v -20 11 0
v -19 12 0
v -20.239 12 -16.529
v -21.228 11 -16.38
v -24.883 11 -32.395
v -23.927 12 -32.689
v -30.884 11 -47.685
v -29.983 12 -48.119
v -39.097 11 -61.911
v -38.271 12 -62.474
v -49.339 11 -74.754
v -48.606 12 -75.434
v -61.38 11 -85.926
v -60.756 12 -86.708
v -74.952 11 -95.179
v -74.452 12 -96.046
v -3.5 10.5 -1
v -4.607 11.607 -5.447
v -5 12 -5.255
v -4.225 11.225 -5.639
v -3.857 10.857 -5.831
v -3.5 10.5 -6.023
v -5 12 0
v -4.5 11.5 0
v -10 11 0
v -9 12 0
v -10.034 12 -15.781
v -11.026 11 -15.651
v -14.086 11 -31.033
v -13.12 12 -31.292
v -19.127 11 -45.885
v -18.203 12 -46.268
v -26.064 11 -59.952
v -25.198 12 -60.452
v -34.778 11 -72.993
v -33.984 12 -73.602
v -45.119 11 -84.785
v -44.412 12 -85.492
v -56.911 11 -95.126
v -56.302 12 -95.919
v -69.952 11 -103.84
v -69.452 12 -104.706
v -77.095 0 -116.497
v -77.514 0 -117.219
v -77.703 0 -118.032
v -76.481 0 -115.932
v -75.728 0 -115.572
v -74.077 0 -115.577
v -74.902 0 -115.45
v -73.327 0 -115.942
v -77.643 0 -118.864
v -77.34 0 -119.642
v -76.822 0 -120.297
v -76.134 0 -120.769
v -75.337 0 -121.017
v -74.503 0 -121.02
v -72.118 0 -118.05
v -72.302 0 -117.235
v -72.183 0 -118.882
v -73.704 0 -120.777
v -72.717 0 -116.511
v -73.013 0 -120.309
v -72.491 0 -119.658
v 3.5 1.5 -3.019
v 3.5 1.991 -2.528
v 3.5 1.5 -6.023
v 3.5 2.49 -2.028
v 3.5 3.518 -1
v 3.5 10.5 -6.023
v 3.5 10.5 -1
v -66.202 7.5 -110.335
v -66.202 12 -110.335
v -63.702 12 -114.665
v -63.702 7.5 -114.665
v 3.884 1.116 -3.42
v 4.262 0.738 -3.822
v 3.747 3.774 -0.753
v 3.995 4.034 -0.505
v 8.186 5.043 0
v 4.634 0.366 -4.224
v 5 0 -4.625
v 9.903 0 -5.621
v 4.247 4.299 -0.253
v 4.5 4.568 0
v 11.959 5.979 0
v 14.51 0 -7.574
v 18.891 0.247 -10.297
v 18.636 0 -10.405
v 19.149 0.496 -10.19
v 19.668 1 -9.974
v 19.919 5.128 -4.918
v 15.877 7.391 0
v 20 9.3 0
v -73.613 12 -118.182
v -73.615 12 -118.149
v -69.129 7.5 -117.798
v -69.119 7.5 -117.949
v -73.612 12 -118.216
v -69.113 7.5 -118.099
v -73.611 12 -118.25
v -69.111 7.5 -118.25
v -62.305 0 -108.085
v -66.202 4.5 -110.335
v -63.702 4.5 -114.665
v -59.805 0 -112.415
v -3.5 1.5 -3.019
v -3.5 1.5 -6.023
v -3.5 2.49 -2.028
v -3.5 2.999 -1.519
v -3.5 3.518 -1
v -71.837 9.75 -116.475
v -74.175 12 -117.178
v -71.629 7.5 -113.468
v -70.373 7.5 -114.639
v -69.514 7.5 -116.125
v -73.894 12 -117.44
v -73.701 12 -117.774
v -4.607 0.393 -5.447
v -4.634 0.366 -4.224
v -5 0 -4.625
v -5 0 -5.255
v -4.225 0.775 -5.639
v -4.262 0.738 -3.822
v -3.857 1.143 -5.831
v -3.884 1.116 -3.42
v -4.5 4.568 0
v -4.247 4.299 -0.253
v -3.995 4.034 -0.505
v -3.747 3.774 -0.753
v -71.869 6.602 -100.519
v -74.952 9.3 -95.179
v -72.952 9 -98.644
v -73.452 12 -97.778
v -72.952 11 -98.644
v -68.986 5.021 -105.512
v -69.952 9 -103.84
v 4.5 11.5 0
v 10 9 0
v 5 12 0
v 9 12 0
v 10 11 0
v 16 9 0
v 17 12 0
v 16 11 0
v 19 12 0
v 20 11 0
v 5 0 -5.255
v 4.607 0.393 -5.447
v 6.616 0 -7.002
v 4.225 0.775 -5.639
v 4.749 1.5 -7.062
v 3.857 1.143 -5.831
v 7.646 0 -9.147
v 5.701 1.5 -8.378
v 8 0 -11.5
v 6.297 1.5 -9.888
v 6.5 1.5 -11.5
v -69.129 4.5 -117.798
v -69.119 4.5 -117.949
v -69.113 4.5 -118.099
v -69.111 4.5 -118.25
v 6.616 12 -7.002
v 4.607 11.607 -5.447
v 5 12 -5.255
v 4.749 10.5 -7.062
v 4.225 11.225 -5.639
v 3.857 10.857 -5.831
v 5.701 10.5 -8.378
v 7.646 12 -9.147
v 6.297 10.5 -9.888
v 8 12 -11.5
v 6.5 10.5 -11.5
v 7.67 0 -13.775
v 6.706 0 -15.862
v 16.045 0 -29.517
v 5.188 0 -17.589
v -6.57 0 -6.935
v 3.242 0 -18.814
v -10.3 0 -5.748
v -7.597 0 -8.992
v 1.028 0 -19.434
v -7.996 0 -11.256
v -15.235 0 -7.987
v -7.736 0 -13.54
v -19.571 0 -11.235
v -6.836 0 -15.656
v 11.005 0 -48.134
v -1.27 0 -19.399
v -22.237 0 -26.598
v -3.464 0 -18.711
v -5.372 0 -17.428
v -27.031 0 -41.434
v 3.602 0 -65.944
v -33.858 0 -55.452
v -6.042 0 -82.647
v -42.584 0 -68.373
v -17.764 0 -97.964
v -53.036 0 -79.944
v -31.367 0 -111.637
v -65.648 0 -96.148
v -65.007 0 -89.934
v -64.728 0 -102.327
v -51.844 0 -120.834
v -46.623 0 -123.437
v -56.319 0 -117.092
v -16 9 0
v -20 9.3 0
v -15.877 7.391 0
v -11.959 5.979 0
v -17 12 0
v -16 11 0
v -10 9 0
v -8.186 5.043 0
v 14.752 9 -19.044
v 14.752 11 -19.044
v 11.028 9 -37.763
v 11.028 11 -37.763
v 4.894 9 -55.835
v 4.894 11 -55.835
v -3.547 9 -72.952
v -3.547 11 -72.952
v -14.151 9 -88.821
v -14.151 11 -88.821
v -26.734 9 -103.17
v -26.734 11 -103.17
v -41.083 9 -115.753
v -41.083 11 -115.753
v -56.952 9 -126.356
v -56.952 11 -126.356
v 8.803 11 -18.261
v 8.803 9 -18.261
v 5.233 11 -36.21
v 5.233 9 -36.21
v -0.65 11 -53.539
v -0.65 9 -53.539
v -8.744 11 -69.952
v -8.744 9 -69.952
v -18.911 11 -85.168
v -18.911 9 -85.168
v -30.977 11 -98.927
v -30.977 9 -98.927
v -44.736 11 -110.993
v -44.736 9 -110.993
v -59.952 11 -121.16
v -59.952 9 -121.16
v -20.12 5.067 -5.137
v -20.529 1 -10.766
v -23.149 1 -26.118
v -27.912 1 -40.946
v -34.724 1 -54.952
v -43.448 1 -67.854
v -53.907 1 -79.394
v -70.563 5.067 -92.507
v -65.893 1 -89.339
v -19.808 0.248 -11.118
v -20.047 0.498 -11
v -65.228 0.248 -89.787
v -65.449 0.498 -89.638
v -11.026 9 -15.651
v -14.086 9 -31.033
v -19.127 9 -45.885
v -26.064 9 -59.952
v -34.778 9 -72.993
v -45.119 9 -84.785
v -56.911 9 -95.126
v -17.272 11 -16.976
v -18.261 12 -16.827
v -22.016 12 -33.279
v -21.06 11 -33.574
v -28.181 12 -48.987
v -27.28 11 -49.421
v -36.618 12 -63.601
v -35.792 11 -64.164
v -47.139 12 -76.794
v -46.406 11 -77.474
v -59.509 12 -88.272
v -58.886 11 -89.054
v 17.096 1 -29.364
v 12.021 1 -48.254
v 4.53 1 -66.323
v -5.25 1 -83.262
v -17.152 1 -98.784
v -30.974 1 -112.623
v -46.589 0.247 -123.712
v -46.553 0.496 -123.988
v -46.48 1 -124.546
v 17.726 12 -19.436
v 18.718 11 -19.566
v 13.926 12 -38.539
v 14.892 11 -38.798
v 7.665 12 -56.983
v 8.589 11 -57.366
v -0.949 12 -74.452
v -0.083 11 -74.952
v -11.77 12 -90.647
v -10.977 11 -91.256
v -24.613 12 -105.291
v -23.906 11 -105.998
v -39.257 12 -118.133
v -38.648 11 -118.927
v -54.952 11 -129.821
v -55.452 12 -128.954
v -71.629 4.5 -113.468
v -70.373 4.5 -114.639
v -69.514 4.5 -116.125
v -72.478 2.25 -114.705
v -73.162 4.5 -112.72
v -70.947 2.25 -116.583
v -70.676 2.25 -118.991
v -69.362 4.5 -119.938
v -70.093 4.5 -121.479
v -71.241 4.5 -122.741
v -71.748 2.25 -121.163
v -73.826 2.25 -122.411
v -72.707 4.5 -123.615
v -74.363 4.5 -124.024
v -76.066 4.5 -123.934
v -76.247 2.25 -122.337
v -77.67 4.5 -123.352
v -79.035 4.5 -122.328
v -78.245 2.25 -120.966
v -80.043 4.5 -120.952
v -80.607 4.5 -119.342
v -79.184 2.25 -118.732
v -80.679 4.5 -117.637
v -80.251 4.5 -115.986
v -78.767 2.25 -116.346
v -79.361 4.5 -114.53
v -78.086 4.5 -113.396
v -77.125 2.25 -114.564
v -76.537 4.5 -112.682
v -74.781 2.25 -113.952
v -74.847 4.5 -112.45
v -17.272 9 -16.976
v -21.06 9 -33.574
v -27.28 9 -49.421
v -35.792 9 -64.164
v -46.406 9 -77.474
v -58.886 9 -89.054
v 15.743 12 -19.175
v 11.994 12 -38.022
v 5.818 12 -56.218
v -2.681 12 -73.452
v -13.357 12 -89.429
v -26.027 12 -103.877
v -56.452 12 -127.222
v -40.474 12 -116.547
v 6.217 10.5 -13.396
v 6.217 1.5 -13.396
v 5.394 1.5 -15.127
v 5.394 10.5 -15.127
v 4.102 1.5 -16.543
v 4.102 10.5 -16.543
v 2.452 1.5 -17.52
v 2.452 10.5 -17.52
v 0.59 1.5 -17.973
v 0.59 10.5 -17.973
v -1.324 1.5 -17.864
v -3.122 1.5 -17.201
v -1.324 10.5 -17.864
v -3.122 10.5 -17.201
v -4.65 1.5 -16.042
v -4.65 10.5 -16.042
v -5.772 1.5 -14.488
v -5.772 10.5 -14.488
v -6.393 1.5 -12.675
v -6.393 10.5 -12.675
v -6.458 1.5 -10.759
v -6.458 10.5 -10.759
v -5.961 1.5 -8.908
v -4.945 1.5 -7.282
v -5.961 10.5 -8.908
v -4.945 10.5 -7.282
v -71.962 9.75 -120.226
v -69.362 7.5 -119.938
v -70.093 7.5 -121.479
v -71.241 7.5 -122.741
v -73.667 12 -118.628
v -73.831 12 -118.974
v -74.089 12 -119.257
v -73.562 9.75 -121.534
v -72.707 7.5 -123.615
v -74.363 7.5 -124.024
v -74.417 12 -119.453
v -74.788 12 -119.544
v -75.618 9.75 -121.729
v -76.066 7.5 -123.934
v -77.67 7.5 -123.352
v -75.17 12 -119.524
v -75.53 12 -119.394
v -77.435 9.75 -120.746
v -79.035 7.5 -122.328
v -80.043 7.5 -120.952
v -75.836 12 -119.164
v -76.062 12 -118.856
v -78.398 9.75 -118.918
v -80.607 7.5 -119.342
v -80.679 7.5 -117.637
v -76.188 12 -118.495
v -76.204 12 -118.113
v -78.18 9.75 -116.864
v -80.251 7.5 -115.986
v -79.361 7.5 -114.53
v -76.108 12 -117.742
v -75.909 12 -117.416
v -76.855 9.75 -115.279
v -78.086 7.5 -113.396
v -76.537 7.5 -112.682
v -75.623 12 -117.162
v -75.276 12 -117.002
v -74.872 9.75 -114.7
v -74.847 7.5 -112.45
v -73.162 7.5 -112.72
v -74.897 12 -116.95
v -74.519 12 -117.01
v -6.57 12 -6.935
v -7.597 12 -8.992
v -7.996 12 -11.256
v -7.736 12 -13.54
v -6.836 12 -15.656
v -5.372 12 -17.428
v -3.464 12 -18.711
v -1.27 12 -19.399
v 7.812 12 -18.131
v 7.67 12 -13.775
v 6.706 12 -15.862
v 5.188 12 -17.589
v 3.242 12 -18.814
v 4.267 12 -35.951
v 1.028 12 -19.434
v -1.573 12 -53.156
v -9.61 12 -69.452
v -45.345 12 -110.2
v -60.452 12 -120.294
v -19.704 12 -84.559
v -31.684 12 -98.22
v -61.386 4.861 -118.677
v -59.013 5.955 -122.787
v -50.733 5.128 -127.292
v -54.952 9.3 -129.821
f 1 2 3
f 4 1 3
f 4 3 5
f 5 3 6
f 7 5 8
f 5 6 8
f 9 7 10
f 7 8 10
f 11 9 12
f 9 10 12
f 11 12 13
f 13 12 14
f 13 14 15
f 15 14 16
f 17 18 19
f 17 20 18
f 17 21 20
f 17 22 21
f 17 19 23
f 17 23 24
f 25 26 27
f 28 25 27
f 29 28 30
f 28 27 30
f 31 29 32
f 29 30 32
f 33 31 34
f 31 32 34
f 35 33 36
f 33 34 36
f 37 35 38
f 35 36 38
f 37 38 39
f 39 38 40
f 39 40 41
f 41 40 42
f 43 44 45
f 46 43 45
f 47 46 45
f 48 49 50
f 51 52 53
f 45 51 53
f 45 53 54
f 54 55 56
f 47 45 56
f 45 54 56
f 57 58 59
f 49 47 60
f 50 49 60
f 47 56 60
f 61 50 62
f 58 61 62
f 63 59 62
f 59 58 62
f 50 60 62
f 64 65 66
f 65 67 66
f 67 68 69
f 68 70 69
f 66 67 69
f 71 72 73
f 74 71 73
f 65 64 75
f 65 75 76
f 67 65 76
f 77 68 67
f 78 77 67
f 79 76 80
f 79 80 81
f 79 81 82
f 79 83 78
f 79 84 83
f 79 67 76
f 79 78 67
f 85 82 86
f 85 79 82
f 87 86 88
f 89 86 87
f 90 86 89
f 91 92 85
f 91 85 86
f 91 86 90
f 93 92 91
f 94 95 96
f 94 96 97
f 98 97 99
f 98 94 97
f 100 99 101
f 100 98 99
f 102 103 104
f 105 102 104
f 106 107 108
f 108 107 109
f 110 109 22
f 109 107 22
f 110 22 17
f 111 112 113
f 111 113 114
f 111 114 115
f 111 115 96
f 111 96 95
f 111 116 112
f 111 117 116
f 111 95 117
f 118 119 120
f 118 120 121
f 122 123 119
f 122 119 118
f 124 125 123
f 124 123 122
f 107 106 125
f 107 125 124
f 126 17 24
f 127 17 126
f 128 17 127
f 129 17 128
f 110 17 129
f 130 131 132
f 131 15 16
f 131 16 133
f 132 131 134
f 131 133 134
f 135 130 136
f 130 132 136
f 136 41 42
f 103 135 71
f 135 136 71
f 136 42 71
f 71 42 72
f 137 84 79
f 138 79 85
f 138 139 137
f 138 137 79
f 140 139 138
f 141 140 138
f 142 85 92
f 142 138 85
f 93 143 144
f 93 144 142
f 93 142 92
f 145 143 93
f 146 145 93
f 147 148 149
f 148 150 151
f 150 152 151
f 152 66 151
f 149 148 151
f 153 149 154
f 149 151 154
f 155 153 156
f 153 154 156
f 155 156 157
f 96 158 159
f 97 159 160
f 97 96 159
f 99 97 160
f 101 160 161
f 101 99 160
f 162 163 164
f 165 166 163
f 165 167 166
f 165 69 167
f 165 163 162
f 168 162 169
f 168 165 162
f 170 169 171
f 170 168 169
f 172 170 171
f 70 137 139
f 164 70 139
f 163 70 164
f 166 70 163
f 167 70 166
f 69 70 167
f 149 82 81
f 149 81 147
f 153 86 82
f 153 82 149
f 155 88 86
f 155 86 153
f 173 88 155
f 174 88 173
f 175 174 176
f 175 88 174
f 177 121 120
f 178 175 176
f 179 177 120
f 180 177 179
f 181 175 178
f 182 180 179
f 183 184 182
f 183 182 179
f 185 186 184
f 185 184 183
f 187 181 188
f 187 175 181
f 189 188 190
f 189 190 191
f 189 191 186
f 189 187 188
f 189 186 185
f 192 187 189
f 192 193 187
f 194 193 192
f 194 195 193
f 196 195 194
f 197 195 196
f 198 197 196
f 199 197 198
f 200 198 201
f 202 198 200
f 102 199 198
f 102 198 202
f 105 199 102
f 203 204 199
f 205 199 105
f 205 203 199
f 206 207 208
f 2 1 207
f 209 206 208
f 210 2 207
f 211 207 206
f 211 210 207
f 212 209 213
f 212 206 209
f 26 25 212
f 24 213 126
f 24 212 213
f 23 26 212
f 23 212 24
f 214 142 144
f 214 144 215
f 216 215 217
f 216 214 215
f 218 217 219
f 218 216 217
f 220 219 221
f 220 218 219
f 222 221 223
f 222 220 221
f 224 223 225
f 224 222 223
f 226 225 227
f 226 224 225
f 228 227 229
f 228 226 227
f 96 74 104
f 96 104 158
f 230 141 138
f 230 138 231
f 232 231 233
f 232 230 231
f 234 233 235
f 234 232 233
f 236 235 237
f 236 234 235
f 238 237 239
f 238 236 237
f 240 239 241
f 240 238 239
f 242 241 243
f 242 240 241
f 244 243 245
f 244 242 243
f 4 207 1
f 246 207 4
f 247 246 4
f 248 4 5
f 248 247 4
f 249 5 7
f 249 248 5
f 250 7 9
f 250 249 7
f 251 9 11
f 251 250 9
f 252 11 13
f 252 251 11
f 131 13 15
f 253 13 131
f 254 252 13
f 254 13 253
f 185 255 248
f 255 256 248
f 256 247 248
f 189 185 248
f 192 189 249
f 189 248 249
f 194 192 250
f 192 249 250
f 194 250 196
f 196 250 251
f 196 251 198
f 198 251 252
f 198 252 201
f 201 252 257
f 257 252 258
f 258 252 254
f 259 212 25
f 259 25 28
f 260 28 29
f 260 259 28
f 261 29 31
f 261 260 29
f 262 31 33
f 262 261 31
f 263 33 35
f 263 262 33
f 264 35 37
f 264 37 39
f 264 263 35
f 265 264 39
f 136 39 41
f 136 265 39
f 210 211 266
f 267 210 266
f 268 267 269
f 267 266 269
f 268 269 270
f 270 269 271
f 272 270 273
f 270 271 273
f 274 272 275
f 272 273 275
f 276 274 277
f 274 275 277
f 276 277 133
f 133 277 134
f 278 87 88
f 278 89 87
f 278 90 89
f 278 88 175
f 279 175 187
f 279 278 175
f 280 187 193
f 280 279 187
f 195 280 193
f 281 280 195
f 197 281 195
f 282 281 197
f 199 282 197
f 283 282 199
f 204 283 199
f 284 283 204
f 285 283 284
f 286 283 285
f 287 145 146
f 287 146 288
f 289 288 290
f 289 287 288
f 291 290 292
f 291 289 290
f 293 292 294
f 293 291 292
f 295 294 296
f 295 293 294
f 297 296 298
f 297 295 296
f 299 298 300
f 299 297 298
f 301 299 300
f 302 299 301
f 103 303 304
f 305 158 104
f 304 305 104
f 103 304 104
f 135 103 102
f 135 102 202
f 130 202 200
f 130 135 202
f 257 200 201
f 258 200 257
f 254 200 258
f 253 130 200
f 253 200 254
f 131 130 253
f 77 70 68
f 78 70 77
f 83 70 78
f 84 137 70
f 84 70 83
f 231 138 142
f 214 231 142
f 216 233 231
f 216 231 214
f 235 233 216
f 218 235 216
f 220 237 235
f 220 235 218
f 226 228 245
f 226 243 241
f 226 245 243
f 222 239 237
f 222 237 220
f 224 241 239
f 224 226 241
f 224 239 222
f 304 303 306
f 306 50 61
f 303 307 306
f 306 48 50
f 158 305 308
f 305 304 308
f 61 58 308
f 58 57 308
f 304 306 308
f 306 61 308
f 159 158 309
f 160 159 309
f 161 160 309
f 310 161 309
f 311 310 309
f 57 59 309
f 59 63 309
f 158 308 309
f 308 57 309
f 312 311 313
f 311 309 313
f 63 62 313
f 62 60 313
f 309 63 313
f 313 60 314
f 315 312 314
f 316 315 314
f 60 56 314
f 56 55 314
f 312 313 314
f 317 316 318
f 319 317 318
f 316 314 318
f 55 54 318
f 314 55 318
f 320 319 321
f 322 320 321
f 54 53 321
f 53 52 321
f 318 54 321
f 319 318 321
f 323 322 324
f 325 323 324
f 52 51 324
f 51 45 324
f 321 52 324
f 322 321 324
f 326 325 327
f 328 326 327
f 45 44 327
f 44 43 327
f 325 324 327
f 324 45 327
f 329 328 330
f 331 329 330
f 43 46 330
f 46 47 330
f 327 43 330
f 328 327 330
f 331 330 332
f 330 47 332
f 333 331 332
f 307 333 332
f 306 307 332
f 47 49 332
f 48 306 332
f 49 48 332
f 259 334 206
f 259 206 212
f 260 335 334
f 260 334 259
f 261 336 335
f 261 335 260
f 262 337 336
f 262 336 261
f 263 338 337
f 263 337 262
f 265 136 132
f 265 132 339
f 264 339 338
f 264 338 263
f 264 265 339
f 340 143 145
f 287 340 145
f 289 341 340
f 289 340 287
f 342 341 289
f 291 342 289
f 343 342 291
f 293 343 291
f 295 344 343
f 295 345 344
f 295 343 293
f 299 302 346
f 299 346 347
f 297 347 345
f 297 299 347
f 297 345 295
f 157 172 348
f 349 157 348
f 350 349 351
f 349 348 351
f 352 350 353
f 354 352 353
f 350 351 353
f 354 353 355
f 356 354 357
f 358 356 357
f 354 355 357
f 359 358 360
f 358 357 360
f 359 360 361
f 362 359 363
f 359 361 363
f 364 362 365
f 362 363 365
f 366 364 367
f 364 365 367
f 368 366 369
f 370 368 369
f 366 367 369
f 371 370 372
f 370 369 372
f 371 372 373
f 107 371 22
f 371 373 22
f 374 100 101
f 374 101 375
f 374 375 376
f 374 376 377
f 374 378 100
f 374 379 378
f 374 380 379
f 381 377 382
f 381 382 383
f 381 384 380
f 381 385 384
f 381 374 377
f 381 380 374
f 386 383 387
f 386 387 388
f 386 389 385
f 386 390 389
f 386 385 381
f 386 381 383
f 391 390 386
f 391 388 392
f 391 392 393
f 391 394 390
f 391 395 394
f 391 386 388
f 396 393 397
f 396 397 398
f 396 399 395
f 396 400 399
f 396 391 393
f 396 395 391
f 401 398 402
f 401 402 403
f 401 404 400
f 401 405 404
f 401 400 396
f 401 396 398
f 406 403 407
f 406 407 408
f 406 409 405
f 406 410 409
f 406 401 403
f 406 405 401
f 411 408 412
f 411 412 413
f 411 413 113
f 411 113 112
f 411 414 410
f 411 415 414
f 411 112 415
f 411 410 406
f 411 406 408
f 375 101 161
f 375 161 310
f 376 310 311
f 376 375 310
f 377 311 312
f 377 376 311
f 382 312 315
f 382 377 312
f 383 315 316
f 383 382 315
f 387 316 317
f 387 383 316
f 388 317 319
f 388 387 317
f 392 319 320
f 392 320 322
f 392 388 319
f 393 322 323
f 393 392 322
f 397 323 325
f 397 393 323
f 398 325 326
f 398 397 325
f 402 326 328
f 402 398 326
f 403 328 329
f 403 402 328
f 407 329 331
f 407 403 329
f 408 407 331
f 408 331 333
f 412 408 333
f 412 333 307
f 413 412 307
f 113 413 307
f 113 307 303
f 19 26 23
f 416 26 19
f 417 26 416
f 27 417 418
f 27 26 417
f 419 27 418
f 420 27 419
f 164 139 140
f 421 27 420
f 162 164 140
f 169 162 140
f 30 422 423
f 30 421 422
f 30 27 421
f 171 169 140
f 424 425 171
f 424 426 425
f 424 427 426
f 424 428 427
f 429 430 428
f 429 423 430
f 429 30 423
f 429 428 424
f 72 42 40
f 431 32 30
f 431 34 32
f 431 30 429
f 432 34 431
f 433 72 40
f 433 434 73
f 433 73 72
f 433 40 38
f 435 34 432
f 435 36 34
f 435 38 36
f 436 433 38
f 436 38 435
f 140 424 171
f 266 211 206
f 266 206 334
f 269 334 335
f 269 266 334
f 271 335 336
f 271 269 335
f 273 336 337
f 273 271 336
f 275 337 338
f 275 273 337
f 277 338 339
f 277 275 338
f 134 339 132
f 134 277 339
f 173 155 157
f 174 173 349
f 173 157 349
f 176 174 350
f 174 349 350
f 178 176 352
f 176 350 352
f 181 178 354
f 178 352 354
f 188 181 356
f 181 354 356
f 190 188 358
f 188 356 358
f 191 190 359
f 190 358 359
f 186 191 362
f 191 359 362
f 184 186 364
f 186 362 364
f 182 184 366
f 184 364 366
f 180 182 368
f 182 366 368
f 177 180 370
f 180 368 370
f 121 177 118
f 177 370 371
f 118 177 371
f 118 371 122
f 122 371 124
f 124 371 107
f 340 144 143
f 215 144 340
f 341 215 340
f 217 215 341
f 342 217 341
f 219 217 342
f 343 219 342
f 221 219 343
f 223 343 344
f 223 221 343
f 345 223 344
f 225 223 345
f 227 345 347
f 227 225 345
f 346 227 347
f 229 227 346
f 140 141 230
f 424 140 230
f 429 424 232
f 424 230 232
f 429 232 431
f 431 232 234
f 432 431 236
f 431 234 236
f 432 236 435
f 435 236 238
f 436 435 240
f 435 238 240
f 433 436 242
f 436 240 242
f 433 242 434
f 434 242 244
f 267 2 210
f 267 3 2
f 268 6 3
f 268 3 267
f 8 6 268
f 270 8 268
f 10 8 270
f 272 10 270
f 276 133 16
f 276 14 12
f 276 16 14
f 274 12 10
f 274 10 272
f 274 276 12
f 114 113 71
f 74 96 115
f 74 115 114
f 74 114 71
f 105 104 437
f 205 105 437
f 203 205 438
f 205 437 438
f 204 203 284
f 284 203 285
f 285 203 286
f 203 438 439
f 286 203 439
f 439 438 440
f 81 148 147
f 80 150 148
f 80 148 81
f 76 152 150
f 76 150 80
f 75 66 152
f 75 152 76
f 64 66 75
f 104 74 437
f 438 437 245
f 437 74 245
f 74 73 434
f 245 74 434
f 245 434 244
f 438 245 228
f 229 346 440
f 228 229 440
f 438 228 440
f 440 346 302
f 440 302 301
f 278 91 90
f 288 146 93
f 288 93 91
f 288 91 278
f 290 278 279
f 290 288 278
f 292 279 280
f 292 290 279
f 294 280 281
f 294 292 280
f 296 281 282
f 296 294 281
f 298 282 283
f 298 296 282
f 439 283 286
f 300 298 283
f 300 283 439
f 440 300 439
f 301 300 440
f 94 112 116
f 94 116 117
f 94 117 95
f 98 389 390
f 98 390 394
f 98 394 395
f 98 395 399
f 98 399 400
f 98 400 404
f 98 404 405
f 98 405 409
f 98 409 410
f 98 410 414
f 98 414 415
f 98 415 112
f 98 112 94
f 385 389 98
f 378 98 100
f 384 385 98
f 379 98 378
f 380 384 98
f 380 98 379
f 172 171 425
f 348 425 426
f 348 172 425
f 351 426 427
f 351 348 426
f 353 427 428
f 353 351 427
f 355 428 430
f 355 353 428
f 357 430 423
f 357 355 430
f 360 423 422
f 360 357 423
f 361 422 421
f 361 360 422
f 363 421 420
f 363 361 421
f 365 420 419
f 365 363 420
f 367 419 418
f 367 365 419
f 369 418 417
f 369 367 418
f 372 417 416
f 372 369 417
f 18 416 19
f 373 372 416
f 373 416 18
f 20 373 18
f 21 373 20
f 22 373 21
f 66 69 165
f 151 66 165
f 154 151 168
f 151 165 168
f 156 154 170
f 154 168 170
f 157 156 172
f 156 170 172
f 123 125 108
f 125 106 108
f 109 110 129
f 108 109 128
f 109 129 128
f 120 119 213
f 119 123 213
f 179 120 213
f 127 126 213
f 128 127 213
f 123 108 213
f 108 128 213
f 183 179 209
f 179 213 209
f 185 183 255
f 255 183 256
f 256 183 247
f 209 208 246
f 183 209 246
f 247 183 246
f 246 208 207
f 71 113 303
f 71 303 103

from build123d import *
from build123d.topology import SkipClean

# Parameters (mm, degrees)
REVOLVE1_ANGLE       = 60
CUT_EXTRUDE1_DEPTH   = 151.383351548
BOSS_EXTRUDE1_DEPTH  = 12
BOSS_EXTRUDE2_DEPTH  = 7.5
CUT_EXTRUDE2_DEPTH   = 4.5
CHAMFER2_SIZE        = 4.5
CHAMFER5_SIZE        = 4.5
CHAMFER5_SIZE_2      = 3
CHAMFER3_SIZE        = 1.5
CUT_REVOLVE1_ANGLE   = 90
CHAMFER4_SIZE        = 4.5
MIRROR4_COPY_1_ANGLE = 90
CHAMFER1_SIZE        = 1


# Some blends are built 0.0001 mm under size
with BuildPart() as part:
    # Sketch2 → Revolve1 (revolve)
    with BuildSketch(Plane.XY):
        Polygon((-16, 12), (-20, 12), (-20, 0), (20, 0), (20, 12), (16, 12), (16, 9), (10, 9), (10, 12), (-10, 12), (-10, 9), (-16, 9), align=None)
    revolve(axis=Axis((-129.903810568, 0, 0), (0, 1, 0)), revolution_arc=REVOLVE1_ANGLE)

    # Sketch3 → Cut-Extrude1 (cut, through all)
    with BuildSketch(Plane(origin=(0, 12, 0), x_dir=(1, 0, 0), z_dir=(0, 1, 0))):
        with BuildLine():
            ThreePointArc((6.5, 11.5), (-3.122498999, 17.200877125), (-3.5, 6.022774425))
            Line((-3.5, 6.022774425), (-3.5, 11.5))
            Line((-3.5, 11.5), (3.5, 11.5))
            Line((3.5, 11.5), (3.5, 6.022774425))
            ThreePointArc((3.5, 6.022774425), (5.700877125, 8.377501001), (6.5, 11.5))
        make_face()
        with BuildLine():
            Line((-3.5, 11.5), (-3.5, 6.022774425))
            ThreePointArc((-3.5, 6.022774425), (0, 5), (3.5, 6.022774425))
            Line((3.5, 6.022774425), (3.5, 11.5))
            Line((3.5, 11.5), (-3.5, 11.5))
        make_face()
        with BuildLine():
            Line((-3.5, 6.022774425), (-3.5, 0))
            Line((-3.5, 0), (3.5, 0))
            Line((3.5, 0), (3.5, 6.022774425))
            ThreePointArc((3.5, 6.022774425), (0, 5), (-3.5, 6.022774425))
        make_face()
    extrude(amount=-CUT_EXTRUDE1_DEPTH, mode=Mode.SUBTRACT)



with BuildPart() as body_2:
    # Sketch4 → Boss-Extrude1 (new body)
    with BuildSketch(Plane(origin=(0, 12, 0), x_dir=(1, 0, 0), z_dir=(0, 1, 0))):
        with BuildLine():
            ThreePointArc((-71.628813948, 113.468163669), (-69.888250085, 115.35), (-69.128813948, 117.798290688))
            Line((-69.128813948, 117.798290688), (-73.661197427, 120.415063509))
            Line((-73.661197427, 120.415063509), (-76.161197427, 116.084936491))
            Line((-76.161197427, 116.084936491), (-71.628813948, 113.468163669))
        make_face()
        with BuildLine():
            Line((-73.661197427, 120.415063509), (-69.128813948, 117.798290688))
            ThreePointArc((-69.128813948, 117.798290688), (-69.115603231, 118.023973649), (-69.111197427, 118.25))
            ThreePointArc((-69.111197427, 118.25), (-80.043342407, 120.952052537), (-71.628813948, 113.468163669))
            Line((-71.628813948, 113.468163669), (-76.161197427, 116.084936491))
            Line((-76.161197427, 116.084936491), (-73.661197427, 120.415063509))
        make_face()
    extrude(amount=-BOSS_EXTRUDE1_DEPTH)


with BuildPart() as part_1:
    add(part.part)

    add(body_2.part)  # Boss-Extrude2 merges body 2
    # Sketch4<3> → Boss-Extrude2 (add)
    with BuildSketch(Plane(origin=(0, 12, 0), x_dir=(1, 0, 0), z_dir=(0, 1, 0))):
        with BuildLine():
            Line((-66.201905284, 110.334936491), (-63.701905284, 114.665063509))
            Line((-63.701905284, 114.665063509), (-69.128813948, 117.798290688))
            ThreePointArc((-69.128813948, 117.798290688), (-69.888250085, 115.35), (-71.628813948, 113.468163669))
            Line((-71.628813948, 113.468163669), (-66.201905284, 110.334936491))
        make_face()
    extrude(amount=-BOSS_EXTRUDE2_DEPTH)

    # Sketch4<5> → Cut-Extrude2 (cut)
    with SkipClean():  # the faces are left unmerged after this step: merging them gives an invalid solid
        with BuildSketch(Plane(origin=(0, 12, 0), x_dir=(1, 0, 0), z_dir=(0, 1, 0))):
            with BuildLine():
                Line((-66.201905284, 110.334936491), (-63.701905284, 114.665063509))
                Line((-63.701905284, 114.665063509), (-69.128813948, 117.798290688))
                ThreePointArc((-69.128813948, 117.798290688), (-69.888250085, 115.35), (-71.628813948, 113.468163669))
                Line((-71.628813948, 113.468163669), (-66.201905284, 110.334936491))
            make_face()
        extrude(amount=-CUT_EXTRUDE2_DEPTH, mode=Mode.SUBTRACT)

    # Chamfer2
    chamfer2_edges = [part_1.edges().sort_by_distance(p)[0] for p in [
        (-79.934144769, 12, -121.15),
    ]]
    chamfer(chamfer2_edges, length=CHAMFER2_SIZE - 0.0001)  # a hair under: the kernel refuses the full size

    # Chamfer5
    # the kernel refuses this chamfer: 4.5, 3 mm, written as the material it takes off along each edge
    with BuildSketch(Plane(origin=(-74.911197427, 0, -118.25), x_dir=(0.5659281860209275, 1.3089718800099638e-15, 0.8244545398425934), z_dir=(-0.8244545398425934, -1.906934193520804e-15, 0.5659281860209275))) as chamfer5_piece_1:
        Polygon((5.8, CHAMFER5_SIZE), (5.8 - CHAMFER5_SIZE_2, 0), (5.8, 0), align=None)
    revolve(axis=Axis((-74.911197427, 0, -118.25), (0, 1, 0)), mode=Mode.SUBTRACT)

    # Chamfer3
    chamfer3_edges = [part_1.edges().sort_by_distance(p)[0] for p in [
        (0, 0, -18),
        (3.5, 0, -3.011387212),
        (-3.5, 12, -3.011387212),
        (-3.5, 0, -3.011387212),
        (0, 12, -18),
        (3.5, 12, -3.011387212),
    ]]
    chamfer(chamfer3_edges, length=CHAMFER3_SIZE)

    # Sketch17 → Cut-Revolve1 (revolve, cut)
    with BuildSketch(Plane(origin=(31.225952642, 0, -54.084936491), x_dir=(0.8660254037844438, 0, 0.49999999999999123), z_dir=(-0.49999999999999123, -1.1564823173178522e-15, 0.8660254037844438))):
        Polygon((-118.766454357, 10.766454357), (-118.766454357, 0), (-108, 0), align=None)
    cut_revolve1 = revolve(axis=Axis((-40.654155872, -1.265151723, -95.584936491), (0, 1, 0)), revolution_arc=CUT_REVOLVE1_ANGLE, mode=Mode.SUBTRACT)

    # Mirror1: Cut-Revolve1 across plane
    add(cut_revolve1.mirror(Plane(origin=(32.475952642, 0, -56.25), x_dir=(0.8660254037844437, 2.0030861316495613e-15, 0.4999999999999914), z_dir=(-0.49999999999999156, -1.1564823173178542e-15, 0.8660254037844436))), mode=Mode.SUBTRACT)

    # Chamfer4
    chamfer4_edges = [part_1.edges().sort_by_distance(p)[0] for p in [
        (-64.951905284, 0, -112.5),
    ]]
    chamfer(chamfer4_edges, length=CHAMFER4_SIZE - 0.0001)  # a hair under: the kernel refuses the full size

    # Mirror4: Cut-Revolve1 across plane
    add(cut_revolve1.mirror(Plane(origin=(-32.475952642, 0, -56.25), x_dir=(-0.8660254037844385, -2.0030861316495455e-15, 0.5000000000000006), z_dir=(-0.5000000000000009, -1.1564823173178735e-15, -0.8660254037844383))), mode=Mode.SUBTRACT)

    # Mirror4 copy 1 sketch → Mirror4 copy 1 (revolve, cut)
    with BuildSketch(Plane(origin=(2.5, 0, -112.5), x_dir=(0, 0, -1), z_dir=(1, 0, 0))):
        Polygon((-118.766454357, 10.766454357), (-118.766454357, 0), (-108, 0), align=None)
    revolve(axis=Axis((2.5, -1.265151723, -29.5), (0, 1, 0)), revolution_arc=MIRROR4_COPY_1_ANGLE, mode=Mode.SUBTRACT)

    # Chamfer1
    chamfer1_edges = [part_1.edges().sort_by_distance(p)[0] for p in [
        (-34.724318643, 0, -54.951905284),
        (-0.083302492, 0, -74.951905284),
        (-3.5, 7.508472143, 0),
        (3.5, 7.508472143, 0),
        (-31.260217028, 12, -56.951905284),
        (-26.064064606, 12, -59.951905284),
        (-8.74355653, 12, -69.951905284),
        (-3.547404107, 12, -72.951905284),
        (-0.083302492, 12, -74.951905284),
        (-34.724318643, 12, -54.951905284),
    ]]
    chamfer(chamfer1_edges, length=CHAMFER1_SIZE)


solid = part_1.part
